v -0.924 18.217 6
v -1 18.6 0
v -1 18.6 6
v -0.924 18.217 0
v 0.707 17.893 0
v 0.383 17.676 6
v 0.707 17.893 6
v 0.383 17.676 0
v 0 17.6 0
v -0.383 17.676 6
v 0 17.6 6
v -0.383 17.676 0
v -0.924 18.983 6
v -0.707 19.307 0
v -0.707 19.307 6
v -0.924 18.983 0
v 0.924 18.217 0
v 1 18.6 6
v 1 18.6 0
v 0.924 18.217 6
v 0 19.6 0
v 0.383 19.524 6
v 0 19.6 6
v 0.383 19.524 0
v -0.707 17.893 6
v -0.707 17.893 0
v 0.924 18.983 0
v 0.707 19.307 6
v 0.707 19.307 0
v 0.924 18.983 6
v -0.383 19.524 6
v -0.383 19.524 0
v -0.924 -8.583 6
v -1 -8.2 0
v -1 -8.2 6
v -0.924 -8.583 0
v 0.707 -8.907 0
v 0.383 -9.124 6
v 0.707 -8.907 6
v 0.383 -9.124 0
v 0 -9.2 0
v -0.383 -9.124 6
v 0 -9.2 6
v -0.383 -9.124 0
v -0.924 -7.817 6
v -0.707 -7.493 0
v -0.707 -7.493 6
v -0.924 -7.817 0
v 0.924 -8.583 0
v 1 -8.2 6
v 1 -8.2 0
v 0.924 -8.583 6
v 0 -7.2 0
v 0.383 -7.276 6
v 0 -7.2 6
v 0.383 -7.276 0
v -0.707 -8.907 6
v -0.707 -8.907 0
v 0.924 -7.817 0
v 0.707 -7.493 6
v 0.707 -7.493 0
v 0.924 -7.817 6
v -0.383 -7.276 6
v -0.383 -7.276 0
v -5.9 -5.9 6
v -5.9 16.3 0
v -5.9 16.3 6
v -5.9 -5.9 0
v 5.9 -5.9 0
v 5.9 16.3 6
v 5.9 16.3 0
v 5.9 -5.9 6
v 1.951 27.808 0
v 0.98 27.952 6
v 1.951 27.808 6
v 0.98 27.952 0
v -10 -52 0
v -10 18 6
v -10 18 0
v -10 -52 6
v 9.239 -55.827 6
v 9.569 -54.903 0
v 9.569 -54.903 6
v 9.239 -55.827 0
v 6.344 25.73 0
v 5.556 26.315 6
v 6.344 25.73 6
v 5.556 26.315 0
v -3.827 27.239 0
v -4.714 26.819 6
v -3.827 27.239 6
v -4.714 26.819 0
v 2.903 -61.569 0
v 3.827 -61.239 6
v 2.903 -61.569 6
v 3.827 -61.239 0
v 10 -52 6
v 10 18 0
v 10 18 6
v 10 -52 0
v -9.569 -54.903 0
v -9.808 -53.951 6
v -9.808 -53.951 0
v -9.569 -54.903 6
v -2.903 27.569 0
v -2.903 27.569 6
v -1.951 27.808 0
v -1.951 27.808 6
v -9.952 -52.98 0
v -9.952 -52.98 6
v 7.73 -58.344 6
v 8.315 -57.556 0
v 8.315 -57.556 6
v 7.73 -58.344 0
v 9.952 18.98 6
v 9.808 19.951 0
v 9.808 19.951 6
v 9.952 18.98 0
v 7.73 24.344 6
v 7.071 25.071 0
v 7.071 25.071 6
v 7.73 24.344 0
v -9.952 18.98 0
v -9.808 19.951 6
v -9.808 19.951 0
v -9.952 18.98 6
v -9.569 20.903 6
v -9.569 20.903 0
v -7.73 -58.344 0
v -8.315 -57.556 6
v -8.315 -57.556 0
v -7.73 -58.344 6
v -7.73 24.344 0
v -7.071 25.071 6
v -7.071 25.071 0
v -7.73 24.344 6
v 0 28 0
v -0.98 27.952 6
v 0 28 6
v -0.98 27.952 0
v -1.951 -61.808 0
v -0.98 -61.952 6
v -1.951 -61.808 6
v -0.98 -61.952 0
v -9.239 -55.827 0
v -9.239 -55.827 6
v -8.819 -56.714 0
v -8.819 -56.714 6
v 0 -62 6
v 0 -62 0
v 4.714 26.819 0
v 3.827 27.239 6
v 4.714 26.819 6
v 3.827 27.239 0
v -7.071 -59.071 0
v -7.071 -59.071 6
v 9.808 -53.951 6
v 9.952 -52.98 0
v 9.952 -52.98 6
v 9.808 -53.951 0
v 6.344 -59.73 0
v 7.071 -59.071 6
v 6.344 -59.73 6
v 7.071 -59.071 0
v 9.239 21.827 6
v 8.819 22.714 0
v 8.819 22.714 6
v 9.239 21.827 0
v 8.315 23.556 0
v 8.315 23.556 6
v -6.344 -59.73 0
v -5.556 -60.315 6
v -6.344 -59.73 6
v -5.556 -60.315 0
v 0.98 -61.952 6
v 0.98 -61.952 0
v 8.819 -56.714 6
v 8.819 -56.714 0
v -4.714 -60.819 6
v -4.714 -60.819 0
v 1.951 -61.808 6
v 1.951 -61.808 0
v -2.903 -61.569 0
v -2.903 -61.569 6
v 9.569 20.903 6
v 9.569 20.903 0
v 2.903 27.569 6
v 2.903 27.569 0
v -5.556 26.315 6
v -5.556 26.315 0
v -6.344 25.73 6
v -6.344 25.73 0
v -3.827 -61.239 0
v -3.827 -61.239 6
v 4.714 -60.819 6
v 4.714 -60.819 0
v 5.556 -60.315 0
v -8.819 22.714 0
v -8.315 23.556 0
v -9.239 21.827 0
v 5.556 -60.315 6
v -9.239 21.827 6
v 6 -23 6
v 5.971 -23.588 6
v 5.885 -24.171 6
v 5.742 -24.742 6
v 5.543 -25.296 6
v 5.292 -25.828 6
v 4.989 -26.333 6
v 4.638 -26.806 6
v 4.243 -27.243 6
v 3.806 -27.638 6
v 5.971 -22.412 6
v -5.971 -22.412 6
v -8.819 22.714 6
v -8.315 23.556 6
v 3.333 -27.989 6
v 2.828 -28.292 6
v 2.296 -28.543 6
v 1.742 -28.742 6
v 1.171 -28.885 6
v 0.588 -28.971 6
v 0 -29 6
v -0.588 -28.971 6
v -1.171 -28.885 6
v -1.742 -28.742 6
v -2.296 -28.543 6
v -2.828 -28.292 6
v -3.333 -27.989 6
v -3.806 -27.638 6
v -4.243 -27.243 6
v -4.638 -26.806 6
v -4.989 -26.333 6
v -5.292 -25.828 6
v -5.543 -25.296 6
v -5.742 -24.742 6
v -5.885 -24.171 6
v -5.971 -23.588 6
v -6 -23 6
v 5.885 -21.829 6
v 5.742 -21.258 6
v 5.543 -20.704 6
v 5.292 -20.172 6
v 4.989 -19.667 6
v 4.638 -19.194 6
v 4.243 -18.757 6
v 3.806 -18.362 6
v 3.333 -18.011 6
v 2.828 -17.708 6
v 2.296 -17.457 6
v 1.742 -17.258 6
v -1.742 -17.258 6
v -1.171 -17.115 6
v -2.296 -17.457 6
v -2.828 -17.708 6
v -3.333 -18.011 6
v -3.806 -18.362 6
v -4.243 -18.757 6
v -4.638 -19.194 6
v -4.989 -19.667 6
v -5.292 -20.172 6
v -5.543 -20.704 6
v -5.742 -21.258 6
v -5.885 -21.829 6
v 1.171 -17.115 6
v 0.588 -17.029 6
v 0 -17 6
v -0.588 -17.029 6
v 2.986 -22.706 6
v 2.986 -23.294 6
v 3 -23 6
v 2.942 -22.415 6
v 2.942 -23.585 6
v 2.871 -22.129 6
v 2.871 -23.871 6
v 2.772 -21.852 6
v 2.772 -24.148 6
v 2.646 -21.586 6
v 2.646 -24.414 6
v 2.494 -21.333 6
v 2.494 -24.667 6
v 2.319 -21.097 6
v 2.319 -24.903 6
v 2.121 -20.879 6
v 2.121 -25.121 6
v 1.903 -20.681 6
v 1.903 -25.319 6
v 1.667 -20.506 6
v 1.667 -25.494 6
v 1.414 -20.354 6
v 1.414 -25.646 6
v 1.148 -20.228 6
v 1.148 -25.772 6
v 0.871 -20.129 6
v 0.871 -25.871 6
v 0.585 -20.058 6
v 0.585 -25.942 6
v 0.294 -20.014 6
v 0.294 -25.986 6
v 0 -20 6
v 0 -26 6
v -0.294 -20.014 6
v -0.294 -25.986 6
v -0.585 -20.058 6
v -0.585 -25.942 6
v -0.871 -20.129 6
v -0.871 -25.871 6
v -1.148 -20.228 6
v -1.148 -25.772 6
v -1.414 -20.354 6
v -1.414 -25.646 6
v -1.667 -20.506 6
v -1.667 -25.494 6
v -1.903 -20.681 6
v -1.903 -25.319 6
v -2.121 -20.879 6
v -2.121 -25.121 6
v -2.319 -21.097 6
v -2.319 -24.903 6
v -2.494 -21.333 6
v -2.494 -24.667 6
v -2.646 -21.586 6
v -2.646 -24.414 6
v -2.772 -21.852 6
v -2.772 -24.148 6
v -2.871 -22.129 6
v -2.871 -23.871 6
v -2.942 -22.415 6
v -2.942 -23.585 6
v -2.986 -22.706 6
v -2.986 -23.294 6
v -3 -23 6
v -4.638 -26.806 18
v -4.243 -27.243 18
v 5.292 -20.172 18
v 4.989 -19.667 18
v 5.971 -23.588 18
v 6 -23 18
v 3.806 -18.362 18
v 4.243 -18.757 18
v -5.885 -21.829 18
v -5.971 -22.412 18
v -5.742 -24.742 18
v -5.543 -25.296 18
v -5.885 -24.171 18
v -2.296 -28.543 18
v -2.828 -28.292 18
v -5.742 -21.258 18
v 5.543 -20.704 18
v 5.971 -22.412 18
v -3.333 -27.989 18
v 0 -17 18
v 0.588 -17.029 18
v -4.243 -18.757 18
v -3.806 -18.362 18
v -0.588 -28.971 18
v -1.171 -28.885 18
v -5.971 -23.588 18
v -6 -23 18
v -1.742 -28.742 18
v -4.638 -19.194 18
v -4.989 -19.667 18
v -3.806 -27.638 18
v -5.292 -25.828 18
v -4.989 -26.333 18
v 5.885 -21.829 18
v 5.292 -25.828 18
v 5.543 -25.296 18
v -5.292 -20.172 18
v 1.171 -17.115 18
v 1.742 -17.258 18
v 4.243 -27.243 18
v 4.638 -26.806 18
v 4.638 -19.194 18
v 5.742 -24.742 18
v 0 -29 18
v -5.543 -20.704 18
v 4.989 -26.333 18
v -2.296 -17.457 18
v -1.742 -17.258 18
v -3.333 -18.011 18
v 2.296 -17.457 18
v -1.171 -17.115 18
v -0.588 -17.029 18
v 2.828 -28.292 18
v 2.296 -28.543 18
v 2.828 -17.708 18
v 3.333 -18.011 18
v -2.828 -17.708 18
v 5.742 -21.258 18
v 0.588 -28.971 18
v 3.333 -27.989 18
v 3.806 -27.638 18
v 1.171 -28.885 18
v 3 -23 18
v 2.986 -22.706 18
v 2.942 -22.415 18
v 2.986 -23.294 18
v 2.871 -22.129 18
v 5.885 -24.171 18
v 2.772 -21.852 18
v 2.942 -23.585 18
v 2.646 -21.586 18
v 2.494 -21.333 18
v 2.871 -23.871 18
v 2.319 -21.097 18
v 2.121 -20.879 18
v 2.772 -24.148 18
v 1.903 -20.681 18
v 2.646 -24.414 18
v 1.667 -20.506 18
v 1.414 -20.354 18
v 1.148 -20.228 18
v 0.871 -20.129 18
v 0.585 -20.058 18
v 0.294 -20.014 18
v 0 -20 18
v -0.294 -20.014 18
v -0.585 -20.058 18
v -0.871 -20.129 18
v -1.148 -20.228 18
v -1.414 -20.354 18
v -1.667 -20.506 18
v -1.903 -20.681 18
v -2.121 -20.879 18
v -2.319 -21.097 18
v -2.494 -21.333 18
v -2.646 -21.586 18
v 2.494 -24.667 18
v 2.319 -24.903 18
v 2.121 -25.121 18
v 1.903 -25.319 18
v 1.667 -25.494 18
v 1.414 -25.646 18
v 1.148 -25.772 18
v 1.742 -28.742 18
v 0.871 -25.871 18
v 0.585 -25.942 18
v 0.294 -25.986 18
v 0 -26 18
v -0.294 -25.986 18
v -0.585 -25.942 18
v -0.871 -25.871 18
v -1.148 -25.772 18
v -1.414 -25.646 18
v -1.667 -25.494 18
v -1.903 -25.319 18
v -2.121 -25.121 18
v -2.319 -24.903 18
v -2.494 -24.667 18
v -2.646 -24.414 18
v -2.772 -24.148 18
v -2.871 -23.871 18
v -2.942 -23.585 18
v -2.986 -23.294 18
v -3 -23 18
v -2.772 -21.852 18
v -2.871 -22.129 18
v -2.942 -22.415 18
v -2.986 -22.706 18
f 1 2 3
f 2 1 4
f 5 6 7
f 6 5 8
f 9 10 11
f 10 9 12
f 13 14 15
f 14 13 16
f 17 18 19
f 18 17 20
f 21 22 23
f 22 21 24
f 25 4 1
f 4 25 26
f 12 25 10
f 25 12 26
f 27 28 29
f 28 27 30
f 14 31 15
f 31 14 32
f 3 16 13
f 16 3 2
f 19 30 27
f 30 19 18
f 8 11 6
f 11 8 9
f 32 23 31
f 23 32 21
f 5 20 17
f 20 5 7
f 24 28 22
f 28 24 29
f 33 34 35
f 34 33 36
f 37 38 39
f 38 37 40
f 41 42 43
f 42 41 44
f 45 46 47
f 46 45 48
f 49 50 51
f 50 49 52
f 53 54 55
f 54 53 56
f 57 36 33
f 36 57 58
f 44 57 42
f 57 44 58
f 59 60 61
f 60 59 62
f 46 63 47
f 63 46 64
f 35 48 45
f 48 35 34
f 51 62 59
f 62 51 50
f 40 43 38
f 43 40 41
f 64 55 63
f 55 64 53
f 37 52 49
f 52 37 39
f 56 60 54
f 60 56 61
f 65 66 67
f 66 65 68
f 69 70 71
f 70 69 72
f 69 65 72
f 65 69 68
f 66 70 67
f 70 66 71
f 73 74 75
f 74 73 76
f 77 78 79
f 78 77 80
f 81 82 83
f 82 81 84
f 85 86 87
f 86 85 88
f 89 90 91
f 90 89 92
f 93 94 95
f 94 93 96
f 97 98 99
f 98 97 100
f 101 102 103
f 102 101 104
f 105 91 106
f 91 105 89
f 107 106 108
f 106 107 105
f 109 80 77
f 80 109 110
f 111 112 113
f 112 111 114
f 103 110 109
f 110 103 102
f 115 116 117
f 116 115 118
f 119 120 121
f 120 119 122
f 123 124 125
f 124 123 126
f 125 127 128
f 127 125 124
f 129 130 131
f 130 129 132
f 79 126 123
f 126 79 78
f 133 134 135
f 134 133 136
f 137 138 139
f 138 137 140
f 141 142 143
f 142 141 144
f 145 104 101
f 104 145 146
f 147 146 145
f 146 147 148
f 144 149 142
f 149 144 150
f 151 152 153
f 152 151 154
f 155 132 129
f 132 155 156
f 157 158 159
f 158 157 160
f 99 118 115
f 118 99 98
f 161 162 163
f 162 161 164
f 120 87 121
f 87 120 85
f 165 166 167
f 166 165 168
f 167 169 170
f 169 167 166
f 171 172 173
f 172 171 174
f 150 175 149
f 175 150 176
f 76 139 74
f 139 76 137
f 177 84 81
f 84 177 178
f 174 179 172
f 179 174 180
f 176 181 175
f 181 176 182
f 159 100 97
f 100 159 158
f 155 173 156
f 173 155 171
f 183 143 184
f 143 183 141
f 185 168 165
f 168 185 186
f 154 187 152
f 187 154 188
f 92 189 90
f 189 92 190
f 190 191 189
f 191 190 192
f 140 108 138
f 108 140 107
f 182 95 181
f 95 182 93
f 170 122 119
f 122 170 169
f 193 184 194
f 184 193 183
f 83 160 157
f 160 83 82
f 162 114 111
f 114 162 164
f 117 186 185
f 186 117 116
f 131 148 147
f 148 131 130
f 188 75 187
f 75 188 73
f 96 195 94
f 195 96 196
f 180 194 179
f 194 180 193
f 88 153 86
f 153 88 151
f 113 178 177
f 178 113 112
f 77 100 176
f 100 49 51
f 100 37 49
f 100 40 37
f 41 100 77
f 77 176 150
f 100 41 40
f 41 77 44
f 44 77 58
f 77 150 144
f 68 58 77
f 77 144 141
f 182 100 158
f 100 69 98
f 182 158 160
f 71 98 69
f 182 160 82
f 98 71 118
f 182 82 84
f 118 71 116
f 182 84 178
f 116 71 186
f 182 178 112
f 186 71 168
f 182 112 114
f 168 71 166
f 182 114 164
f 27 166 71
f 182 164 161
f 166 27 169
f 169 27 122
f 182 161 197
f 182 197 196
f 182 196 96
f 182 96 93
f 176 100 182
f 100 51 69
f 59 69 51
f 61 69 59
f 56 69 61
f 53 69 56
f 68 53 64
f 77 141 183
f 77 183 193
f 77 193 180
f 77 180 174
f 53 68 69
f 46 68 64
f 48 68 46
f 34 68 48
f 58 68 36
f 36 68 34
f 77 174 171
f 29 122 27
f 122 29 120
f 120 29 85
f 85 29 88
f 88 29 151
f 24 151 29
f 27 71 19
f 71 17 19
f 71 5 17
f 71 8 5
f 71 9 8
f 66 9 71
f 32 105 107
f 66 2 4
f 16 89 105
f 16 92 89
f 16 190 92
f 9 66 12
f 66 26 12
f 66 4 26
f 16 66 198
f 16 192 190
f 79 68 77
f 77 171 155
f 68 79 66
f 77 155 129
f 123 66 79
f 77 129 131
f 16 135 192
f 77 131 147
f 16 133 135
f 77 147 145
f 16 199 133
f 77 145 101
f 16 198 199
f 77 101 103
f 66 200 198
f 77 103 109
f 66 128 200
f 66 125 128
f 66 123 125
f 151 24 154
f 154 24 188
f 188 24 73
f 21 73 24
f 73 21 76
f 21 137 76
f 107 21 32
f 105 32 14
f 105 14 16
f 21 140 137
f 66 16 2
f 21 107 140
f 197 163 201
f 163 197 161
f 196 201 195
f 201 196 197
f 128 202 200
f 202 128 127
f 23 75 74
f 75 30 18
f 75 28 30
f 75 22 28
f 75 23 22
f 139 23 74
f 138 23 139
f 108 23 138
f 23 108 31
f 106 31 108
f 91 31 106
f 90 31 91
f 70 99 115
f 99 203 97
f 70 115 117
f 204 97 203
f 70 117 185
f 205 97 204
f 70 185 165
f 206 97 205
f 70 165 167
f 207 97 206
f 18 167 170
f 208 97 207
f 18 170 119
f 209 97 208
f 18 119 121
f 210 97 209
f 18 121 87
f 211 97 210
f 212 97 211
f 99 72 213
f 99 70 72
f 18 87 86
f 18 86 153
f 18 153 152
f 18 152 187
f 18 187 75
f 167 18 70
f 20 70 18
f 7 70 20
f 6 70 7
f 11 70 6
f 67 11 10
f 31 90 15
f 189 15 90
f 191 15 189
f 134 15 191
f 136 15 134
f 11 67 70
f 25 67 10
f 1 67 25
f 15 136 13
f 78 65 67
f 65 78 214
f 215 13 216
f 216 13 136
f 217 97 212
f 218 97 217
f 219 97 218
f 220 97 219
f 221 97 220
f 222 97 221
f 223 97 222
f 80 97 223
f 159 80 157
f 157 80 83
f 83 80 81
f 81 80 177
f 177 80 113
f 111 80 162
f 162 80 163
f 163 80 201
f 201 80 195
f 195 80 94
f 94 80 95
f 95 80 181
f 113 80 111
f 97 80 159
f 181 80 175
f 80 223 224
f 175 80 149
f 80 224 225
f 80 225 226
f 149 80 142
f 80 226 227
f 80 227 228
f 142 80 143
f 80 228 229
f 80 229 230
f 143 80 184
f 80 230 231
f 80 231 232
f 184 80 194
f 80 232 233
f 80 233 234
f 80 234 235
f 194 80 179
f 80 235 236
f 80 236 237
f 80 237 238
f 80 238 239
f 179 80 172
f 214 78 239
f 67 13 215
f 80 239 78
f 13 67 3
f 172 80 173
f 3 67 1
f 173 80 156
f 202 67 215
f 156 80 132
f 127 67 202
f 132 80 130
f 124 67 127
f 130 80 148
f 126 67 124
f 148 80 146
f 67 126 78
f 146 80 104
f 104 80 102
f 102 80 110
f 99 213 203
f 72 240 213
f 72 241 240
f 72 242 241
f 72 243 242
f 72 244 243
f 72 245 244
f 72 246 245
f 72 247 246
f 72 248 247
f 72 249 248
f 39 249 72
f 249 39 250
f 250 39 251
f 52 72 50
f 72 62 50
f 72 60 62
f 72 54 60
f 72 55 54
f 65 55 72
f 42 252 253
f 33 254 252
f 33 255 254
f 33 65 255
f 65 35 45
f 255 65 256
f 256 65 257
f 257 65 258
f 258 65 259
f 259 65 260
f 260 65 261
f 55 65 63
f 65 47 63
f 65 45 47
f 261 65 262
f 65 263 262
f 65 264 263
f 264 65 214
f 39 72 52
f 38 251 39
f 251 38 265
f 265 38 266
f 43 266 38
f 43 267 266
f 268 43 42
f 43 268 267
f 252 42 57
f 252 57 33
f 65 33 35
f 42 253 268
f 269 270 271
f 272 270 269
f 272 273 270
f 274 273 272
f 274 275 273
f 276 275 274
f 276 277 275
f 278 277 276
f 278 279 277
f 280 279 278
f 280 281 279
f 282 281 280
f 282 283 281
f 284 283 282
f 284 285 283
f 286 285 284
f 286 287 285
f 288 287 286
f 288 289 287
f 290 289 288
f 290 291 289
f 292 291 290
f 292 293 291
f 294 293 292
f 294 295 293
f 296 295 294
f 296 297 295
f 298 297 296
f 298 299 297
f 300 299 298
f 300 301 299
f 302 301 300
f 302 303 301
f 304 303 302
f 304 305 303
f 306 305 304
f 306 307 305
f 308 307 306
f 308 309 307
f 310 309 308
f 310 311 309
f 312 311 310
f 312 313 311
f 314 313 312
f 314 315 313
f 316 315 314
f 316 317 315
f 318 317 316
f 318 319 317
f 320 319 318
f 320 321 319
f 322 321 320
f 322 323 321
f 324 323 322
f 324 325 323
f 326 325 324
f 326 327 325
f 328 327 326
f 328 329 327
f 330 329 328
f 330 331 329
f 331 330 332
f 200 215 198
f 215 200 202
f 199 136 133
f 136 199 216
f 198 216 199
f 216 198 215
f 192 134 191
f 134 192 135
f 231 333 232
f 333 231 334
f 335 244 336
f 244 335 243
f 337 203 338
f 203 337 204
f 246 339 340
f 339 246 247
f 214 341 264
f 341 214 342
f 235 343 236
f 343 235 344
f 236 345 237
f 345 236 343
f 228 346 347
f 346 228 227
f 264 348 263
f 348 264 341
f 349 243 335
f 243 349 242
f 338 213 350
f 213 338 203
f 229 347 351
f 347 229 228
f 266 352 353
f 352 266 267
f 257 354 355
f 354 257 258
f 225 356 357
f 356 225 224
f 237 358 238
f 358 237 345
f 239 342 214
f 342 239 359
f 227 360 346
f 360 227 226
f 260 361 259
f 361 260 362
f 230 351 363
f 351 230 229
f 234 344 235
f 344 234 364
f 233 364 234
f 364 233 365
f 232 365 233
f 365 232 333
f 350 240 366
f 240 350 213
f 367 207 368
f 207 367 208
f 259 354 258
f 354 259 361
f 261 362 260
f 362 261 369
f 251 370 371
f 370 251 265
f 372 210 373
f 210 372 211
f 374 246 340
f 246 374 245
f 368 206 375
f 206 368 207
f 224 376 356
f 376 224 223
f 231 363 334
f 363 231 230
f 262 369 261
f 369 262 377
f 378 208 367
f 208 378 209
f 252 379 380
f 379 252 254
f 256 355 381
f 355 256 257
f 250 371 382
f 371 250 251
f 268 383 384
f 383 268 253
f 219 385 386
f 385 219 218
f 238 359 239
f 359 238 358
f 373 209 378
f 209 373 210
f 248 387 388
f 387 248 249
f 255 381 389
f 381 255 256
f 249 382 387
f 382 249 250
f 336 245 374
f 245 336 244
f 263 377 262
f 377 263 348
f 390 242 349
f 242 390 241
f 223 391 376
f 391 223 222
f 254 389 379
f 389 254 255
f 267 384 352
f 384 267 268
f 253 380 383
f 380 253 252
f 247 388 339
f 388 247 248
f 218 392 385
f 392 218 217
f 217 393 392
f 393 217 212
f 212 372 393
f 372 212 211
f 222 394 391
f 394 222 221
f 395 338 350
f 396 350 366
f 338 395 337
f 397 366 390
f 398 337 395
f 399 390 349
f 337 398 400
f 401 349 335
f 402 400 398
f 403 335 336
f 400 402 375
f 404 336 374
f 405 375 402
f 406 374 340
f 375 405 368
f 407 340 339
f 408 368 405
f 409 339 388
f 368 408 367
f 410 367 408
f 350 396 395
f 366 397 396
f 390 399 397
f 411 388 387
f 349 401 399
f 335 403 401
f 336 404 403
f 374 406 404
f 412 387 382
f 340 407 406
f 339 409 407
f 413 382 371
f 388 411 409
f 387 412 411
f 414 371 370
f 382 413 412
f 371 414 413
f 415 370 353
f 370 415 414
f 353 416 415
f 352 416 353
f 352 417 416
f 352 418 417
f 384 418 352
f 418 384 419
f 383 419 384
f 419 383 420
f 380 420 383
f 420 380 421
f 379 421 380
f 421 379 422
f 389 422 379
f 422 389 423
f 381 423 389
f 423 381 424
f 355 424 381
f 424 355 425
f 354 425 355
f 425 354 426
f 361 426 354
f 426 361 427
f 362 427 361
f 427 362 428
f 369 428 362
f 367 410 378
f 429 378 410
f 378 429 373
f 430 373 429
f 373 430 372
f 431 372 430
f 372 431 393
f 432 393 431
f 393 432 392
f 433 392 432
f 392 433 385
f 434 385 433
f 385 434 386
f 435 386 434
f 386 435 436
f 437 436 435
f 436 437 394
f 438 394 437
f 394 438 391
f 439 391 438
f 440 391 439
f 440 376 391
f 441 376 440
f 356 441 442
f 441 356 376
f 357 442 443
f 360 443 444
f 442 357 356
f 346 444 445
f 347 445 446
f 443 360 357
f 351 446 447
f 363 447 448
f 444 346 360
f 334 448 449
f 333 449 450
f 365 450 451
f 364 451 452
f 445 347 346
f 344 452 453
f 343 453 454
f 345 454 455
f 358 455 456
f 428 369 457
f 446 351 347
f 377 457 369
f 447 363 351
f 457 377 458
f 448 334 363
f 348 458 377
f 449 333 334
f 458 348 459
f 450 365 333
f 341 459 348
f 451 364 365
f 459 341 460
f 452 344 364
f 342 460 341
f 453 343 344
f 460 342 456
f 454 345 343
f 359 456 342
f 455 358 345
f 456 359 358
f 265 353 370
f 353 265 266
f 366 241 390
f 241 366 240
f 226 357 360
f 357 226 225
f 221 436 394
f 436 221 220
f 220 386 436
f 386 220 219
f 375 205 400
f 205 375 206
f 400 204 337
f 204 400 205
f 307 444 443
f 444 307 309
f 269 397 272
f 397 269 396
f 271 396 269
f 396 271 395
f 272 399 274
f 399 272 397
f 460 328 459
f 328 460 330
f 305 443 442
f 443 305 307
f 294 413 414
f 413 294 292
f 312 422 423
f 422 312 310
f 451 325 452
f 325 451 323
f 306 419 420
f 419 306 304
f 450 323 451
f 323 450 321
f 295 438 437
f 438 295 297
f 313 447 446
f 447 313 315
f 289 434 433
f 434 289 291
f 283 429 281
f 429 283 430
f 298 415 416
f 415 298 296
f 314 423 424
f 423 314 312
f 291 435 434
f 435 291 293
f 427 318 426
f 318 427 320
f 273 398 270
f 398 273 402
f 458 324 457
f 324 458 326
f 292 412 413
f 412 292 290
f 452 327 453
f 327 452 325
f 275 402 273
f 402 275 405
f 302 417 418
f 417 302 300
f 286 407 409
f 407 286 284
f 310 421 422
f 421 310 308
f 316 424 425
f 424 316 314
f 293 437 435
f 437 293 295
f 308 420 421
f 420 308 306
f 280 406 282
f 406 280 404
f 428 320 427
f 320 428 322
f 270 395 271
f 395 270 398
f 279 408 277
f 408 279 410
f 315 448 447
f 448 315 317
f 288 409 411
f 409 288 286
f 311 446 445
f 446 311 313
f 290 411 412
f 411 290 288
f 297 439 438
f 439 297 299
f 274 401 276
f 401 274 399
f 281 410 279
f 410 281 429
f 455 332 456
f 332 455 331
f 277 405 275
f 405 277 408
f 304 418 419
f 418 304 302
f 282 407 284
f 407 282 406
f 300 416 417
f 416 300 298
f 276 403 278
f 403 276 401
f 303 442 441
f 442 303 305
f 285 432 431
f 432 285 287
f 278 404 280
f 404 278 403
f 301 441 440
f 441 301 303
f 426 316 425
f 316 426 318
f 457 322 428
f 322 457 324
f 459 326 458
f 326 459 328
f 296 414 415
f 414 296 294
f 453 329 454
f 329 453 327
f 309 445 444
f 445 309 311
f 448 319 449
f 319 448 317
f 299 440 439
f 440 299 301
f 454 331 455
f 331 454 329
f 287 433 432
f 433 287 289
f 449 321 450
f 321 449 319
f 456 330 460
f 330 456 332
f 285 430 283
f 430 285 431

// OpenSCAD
// file: ../envelopes/servo-envelope.scad
// Enveloppe for servo holes fixations
// Around the servo motor and the fixation holes

module servoEnvelope(
    servo_hole_scale = 1,
    screw_hole_diameter = 2
) {

    servo_length = 22.2;
    servo_width = 11.8;
    servo_height = 22.7;

    // translating to center the servo motor envelope as servo
    scale(servo_hole_scale)
        translate([-servo_width / 2, - servo_length + (servo_width / 2), -servo_height/2])
            cube([servo_width, servo_length, servo_height], center = false);    

    
    translate([-servo_width / 2, - servo_length + (servo_width / 2), -servo_height/2]) {
        translate([servo_width / 2, - 2.3, 0])
            cylinder(h = servo_height, r = 1, center = false, $fn = 16);

        translate([servo_width / 2, servo_length + 2.3, 0])
            cylinder(h = servo_height, r = 1, center = false, $fn = 16);
    }
}
// main file
use <../envelopes/servo-envelope.scad>

legPieceB();

/**
 * LegPieceB
 * @description Leg Piece B
 * @category leg
 * @tag piece
 */
module legPieceB(
    length = 70,
    servo_axis_offset = 52,
    fixation_axis_offset = 29
    ) {

    _fn = 64;
    width = 10;
    thickness = 6;

    support_diameter = 12;
    support_thickness = 12;
    
    hole_diameter = 3;

    translate([0, -servo_axis_offset, 0]) {

        difference() {    
            hull() {
                cylinder(h = thickness, r = width, center = false, $fn = _fn);
                translate([0, length, 0])
                cylinder(h = thickness, r = width, center = false, $fn = _fn);
            }

            translate([0, servo_axis_offset, 0])
                rotate([0, 0, 180])
                    servoEnvelope();
        }

        
        translate([0, 0, thickness])
            difference() {
                hull() {
                    translate([0, fixation_axis_offset, 0])
                        cylinder(h = support_thickness, r = support_diameter / 2, center = false, $fn = _fn);
                }
                
                translate([0, fixation_axis_offset, 0])
                    cylinder(h = thickness * support_thickness, r = hole_diameter, center = true, $fn = _fn);
            }
    }
}
